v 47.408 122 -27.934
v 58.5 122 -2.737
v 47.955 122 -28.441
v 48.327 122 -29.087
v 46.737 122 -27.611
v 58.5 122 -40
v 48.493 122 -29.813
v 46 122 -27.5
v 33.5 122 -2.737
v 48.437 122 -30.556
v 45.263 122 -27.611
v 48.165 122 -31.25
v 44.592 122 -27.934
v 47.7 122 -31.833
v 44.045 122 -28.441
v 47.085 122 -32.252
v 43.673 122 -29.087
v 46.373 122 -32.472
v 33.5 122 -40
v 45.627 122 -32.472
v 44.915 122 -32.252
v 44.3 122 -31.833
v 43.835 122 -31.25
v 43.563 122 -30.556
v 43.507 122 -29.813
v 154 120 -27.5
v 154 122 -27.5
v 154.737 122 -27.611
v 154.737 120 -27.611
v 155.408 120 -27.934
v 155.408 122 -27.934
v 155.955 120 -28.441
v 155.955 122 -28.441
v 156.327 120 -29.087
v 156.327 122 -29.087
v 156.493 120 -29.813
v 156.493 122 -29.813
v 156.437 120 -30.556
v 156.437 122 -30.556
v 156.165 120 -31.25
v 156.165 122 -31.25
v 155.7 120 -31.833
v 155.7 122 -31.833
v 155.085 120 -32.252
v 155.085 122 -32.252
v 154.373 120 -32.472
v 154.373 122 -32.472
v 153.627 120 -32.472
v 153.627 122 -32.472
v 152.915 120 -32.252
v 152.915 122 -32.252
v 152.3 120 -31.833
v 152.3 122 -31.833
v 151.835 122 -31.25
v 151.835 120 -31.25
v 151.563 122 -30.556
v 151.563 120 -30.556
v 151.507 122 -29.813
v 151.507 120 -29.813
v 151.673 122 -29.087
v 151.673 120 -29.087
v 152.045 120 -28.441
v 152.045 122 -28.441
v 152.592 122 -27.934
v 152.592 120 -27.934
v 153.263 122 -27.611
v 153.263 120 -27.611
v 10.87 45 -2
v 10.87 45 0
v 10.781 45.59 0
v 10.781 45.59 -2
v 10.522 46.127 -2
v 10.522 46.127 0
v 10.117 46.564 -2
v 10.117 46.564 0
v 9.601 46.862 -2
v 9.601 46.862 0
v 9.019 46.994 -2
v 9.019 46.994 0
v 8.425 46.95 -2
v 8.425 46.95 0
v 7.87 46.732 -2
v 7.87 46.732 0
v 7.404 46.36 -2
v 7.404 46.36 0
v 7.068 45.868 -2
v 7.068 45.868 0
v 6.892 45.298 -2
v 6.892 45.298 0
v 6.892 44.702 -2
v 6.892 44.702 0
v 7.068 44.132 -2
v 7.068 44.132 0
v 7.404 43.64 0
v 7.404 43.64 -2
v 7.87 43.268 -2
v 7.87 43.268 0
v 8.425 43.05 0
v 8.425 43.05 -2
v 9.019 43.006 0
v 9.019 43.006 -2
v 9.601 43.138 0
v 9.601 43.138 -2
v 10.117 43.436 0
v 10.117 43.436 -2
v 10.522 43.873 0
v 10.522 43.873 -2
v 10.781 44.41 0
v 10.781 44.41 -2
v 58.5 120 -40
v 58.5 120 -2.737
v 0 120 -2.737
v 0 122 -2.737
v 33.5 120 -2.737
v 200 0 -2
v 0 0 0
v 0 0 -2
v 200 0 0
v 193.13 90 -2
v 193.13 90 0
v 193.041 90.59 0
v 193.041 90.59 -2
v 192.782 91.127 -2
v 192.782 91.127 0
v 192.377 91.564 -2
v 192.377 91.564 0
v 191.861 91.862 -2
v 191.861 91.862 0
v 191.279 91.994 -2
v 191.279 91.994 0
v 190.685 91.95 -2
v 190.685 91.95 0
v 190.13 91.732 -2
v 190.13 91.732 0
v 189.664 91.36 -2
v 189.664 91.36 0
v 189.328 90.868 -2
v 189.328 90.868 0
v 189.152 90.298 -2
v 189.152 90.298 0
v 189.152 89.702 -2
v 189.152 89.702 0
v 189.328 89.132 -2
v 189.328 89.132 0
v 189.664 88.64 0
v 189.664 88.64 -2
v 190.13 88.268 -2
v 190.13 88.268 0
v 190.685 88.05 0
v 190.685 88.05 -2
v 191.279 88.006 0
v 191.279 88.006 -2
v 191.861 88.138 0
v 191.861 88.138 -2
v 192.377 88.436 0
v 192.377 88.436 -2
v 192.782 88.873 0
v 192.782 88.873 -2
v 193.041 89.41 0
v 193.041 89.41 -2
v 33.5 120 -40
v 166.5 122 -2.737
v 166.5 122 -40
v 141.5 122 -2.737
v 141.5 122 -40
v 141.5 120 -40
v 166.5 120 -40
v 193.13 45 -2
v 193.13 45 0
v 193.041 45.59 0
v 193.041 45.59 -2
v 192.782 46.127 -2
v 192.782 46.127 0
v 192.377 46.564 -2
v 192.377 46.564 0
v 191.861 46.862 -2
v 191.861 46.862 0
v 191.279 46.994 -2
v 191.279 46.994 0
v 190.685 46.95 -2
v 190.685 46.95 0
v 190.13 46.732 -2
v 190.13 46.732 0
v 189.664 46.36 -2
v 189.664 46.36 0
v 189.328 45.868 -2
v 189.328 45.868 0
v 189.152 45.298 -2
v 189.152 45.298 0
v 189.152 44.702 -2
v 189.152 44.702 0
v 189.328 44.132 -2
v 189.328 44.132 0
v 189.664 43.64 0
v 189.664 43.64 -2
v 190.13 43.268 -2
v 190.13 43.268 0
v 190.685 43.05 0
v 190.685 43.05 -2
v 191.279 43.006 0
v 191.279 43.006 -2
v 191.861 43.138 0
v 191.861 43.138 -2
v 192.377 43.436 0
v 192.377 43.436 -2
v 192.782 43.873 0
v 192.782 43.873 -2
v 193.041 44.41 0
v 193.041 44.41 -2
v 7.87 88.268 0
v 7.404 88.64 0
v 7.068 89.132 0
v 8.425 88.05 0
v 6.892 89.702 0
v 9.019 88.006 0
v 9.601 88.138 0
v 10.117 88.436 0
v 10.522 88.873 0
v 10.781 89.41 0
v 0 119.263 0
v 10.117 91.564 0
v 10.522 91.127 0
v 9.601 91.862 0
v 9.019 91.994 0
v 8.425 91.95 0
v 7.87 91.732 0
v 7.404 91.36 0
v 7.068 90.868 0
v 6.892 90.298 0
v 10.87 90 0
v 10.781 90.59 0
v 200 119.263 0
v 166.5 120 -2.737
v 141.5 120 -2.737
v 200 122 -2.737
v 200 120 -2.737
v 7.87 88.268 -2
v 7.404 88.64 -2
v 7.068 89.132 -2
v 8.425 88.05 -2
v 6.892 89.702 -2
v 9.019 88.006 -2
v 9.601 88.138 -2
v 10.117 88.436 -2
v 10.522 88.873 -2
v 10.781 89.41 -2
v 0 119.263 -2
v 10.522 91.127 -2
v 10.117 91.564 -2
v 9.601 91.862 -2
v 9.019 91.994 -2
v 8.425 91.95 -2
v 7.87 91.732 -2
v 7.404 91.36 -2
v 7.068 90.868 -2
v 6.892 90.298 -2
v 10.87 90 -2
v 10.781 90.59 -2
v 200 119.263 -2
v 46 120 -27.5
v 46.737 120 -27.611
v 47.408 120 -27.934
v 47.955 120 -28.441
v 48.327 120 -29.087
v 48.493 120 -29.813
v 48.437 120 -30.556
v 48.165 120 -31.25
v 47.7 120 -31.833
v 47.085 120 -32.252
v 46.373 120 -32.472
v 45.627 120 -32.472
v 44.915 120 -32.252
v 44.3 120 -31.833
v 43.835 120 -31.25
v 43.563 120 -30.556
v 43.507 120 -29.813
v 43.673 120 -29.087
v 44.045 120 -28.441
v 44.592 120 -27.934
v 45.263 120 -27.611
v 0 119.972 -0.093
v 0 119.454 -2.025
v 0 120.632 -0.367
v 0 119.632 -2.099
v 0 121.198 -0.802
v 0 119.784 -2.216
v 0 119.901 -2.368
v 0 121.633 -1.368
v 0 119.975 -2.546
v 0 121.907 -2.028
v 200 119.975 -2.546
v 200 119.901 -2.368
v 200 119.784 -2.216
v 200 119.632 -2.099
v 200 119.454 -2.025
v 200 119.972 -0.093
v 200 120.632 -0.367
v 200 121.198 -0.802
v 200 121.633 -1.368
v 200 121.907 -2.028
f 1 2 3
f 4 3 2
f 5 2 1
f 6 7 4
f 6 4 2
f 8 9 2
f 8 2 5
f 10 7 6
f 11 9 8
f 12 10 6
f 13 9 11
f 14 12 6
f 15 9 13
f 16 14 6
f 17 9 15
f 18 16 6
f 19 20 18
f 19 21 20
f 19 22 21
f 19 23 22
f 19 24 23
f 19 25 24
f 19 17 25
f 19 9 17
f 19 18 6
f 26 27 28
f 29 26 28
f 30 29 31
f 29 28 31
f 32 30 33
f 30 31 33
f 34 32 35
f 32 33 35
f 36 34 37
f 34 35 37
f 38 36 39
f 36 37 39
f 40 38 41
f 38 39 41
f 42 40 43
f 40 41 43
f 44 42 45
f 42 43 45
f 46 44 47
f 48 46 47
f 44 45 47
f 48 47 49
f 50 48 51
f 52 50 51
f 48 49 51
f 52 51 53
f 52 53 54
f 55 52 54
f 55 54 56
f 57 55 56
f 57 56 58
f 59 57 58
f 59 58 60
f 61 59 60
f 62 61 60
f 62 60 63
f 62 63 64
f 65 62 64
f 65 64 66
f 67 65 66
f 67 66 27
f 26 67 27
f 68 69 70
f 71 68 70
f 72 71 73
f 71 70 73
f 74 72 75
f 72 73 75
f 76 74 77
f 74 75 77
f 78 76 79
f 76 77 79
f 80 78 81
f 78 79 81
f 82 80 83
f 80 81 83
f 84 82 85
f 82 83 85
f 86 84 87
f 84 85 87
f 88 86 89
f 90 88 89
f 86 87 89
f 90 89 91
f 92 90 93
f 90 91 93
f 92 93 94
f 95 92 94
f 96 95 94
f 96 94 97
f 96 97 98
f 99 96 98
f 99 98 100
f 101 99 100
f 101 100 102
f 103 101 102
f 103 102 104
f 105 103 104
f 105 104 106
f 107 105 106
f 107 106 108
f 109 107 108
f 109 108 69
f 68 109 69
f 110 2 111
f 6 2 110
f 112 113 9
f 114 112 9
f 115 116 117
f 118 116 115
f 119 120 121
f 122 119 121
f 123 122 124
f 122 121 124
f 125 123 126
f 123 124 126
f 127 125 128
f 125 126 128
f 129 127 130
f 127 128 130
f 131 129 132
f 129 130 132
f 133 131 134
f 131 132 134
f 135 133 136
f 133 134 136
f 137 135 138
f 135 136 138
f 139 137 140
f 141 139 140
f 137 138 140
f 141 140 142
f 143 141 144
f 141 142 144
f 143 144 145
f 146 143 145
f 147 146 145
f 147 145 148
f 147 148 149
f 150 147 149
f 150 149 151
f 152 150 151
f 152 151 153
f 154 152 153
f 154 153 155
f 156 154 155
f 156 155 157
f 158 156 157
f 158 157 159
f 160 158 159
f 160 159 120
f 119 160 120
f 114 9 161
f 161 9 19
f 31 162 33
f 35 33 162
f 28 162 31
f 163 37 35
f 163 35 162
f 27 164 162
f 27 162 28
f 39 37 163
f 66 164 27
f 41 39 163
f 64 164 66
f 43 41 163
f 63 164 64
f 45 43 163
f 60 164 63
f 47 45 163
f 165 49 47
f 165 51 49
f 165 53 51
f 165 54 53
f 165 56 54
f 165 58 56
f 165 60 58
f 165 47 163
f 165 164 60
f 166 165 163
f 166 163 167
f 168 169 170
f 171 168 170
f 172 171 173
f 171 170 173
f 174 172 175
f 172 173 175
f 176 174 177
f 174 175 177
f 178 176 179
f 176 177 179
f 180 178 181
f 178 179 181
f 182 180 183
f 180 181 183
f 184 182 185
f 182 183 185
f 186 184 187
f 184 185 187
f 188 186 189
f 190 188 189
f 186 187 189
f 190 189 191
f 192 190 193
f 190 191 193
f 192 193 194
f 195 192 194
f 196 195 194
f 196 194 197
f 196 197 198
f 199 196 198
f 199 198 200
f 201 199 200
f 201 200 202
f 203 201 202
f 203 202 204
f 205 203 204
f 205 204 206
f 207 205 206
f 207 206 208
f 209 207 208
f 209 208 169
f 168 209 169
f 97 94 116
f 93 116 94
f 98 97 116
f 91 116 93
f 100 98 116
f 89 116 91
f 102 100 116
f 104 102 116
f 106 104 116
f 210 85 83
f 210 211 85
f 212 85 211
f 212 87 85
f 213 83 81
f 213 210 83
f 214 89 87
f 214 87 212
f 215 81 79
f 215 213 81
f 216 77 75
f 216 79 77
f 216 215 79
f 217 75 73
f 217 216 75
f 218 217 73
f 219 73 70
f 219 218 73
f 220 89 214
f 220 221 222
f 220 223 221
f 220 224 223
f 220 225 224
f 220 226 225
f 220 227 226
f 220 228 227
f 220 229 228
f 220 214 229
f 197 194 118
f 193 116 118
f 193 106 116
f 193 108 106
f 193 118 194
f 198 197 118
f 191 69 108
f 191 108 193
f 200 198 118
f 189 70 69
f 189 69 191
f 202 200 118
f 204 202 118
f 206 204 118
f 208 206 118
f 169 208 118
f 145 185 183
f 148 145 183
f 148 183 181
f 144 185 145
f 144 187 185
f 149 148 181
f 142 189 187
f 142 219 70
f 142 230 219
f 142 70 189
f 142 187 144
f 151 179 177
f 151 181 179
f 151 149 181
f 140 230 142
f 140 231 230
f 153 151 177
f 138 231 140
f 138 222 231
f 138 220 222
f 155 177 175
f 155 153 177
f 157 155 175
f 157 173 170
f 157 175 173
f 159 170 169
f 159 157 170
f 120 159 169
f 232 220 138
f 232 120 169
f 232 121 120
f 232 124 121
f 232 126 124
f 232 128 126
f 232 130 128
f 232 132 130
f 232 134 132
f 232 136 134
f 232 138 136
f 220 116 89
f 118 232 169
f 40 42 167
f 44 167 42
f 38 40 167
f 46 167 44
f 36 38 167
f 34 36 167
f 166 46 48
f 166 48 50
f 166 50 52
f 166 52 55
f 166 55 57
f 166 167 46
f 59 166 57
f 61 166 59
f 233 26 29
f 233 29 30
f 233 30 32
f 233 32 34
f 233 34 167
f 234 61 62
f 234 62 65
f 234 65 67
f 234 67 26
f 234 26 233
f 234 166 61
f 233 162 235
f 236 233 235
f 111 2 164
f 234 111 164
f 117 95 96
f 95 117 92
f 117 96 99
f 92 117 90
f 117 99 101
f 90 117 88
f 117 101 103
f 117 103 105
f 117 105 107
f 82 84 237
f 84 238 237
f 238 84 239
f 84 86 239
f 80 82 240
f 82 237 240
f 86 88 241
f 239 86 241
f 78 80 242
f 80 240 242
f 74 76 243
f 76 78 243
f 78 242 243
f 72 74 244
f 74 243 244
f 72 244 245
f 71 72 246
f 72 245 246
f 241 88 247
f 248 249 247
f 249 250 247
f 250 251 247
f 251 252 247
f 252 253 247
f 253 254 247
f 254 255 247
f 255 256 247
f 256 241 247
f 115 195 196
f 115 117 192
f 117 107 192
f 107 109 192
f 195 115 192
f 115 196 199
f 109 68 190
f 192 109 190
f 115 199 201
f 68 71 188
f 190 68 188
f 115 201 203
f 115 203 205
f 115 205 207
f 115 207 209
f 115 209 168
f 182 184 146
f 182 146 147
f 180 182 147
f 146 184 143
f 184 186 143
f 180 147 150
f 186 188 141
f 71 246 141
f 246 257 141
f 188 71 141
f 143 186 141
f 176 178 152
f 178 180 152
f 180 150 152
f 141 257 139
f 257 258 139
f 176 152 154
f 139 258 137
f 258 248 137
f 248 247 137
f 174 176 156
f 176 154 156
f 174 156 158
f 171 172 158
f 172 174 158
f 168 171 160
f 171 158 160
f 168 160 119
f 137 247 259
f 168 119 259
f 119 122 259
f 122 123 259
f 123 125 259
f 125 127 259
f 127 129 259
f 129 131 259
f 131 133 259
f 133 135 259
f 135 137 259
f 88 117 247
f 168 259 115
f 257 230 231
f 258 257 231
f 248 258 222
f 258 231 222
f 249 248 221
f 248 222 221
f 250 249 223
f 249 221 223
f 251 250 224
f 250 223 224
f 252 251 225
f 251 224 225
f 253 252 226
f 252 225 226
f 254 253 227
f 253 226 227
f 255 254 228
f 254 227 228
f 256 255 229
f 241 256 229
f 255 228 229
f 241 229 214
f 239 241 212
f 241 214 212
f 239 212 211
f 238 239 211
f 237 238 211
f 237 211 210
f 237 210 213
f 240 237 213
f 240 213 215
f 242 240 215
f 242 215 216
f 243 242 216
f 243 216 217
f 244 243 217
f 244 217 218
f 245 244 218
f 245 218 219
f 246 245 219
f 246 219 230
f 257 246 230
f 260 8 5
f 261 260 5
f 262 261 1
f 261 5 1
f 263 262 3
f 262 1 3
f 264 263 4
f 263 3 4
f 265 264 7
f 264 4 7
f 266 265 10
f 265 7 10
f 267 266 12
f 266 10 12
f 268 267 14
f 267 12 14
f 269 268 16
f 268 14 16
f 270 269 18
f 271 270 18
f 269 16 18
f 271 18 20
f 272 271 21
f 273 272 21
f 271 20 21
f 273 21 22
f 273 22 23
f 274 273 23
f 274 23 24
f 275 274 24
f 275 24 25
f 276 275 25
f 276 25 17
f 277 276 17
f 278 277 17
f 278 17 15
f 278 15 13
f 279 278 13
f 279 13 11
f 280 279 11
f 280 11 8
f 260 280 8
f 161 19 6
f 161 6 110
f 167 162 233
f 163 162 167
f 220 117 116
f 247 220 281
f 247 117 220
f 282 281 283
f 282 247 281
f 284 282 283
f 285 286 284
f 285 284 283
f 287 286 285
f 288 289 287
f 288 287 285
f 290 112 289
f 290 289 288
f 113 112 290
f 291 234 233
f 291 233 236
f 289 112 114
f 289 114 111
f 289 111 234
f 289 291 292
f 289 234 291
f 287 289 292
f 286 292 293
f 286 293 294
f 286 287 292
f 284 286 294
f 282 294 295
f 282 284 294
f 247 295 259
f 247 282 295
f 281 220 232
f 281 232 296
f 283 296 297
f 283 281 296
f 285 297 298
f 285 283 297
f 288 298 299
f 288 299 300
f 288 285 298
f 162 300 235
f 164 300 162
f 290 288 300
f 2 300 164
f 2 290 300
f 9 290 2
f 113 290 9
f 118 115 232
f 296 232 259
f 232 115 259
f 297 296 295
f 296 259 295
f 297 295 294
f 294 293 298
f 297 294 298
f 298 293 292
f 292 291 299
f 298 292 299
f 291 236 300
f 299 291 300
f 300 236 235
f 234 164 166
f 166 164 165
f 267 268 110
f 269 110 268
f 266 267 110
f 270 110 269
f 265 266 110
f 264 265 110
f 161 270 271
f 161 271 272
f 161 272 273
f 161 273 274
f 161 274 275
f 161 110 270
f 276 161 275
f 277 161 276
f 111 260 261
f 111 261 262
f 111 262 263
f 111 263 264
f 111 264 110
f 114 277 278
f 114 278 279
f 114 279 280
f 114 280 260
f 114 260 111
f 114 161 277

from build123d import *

# Parameters (mm, degrees)
SKETCH2_W                    = 200
SKETCH2_H                    = 120
BASE_FLANGE1_DEPTH           = 2
CUT_EXTRUDE1_REACH           = 235.247
SKETCH7_R                    = 2
EDGE_FLANGE1_STRIP_W         = 9.4732
EDGE_FLANGE1_STRIP_H         = 2
EDGE_FLANGE1_STRIP_CUT_DEPTH = 200
EDGE_FLANGE1_DEPTH           = 200
CUT_EXTRUDE2_REACH           = 239.664
SKETCH11_R                   = 2.5
SKETCH11_W                   = 33.5
SKETCH11_H                   = 37.2634
SKETCH11_W_2                 = 83


# Sheet-metal steps are written as plain solids
with BuildPart() as part:
    # Sketch2 → Base-Flange1 (new body)
    with BuildSketch(Plane.XY):
        with Locations((100, 60)):
            Rectangle(SKETCH2_W, SKETCH2_H)
    extrude(amount=-BASE_FLANGE1_DEPTH)

    # Sketch7 → Cut-Extrude1 (cut, up to next)
    with BuildSketch(Plane.XY, mode=Mode.PRIVATE) as cut_extrude1_sk1:
        with Locations((8.87, 90)):
            Circle(SKETCH7_R)
    cut_extrude1_tool1 = extrude(cut_extrude1_sk1.sketch, amount=-CUT_EXTRUDE1_REACH, mode=Mode.PRIVATE) & part.part
    # Sketch7 → Cut-Extrude1 (cut, up to next)
    with BuildSketch(Plane.XY, mode=Mode.PRIVATE) as cut_extrude1_sk2:
        with Locations((8.87, 45)):
            Circle(SKETCH7_R)
    cut_extrude1_tool2 = extrude(cut_extrude1_sk2.sketch, amount=-CUT_EXTRUDE1_REACH, mode=Mode.PRIVATE) & part.part
    # Sketch7 → Cut-Extrude1 (cut, up to next)
    with BuildSketch(Plane.XY, mode=Mode.PRIVATE) as cut_extrude1_sk3:
        with Locations((191.13, 45)):
            Circle(SKETCH7_R)
    cut_extrude1_tool3 = extrude(cut_extrude1_sk3.sketch, amount=-CUT_EXTRUDE1_REACH, mode=Mode.PRIVATE) & part.part
    # Sketch7 → Cut-Extrude1 (cut, up to next)
    with BuildSketch(Plane.XY, mode=Mode.PRIVATE) as cut_extrude1_sk4:
        with Locations((191.13, 90)):
            Circle(SKETCH7_R)
    cut_extrude1_tool4 = extrude(cut_extrude1_sk4.sketch, amount=-CUT_EXTRUDE1_REACH, mode=Mode.PRIVATE) & part.part
    add(cut_extrude1_tool1.solids().sort_by_distance((8.87, 90, 0))[0], mode=Mode.SUBTRACT)
    add(cut_extrude1_tool2.solids().sort_by_distance((8.87, 45, 0))[0], mode=Mode.SUBTRACT)
    add(cut_extrude1_tool3.solids().sort_by_distance((191.13, 45, 0))[0], mode=Mode.SUBTRACT)
    add(cut_extrude1_tool4.solids().sort_by_distance((191.13, 90, 0))[0], mode=Mode.SUBTRACT)

    # Edge-Flange1 strip (across the edge) → Edge-Flange1 strip cut (cut)
    with BuildSketch(Plane(origin=(0, 120, -2), x_dir=(0, -1, 0), z_dir=(1, 0, 0))):
        with Locations((-4, -1)):
            Rectangle(EDGE_FLANGE1_STRIP_W, EDGE_FLANGE1_STRIP_H)
    extrude(amount=EDGE_FLANGE1_STRIP_CUT_DEPTH, mode=Mode.SUBTRACT)

    # Edge-Flange1 section (across the edge) → Edge-Flange1 (add)
    with BuildSketch(Plane(origin=(0, 120, -2), x_dir=(0, -1, 0), z_dir=(1, 0, 0))):
        with BuildLine():
            Line((-2, 0.7366), (-2, 38))
            Line((-2, 38), (0, 38))
            Line((0, 38), (0, 0.7366))
            ThreePointArc((0, 0.7366), (0.215745145, 0.215745145), (0.7366, 0))
            Line((0.7366, 0), (0.7366, -2))
            ThreePointArc((0.7366, -2), (-1.198468417, -1.198468417), (-2, 0.7366))
        make_face()
    extrude(amount=EDGE_FLANGE1_DEPTH)

    # Sketch11 → Cut-Extrude2 (cut, up to next)
    with BuildSketch(Plane(origin=(0, 122, 0), x_dir=(1, 0, 0), z_dir=(0, 1, 0)), mode=Mode.PRIVATE) as cut_extrude2_sk1:
        with Locations(Location((154, 30, 0), (0, 0, 270))):
            Circle(SKETCH11_R)
    cut_extrude2_tool1 = extrude(cut_extrude2_sk1.sketch, amount=-CUT_EXTRUDE2_REACH, mode=Mode.PRIVATE) & part.part
    # Sketch11 → Cut-Extrude2 (cut, up to next)
    with BuildSketch(Plane(origin=(0, 122, 0), x_dir=(1, 0, 0), z_dir=(0, 1, 0)), mode=Mode.PRIVATE) as cut_extrude2_sk2:
        with Locations(Location((46, 30, 0), (0, 0, 270))):
            Circle(SKETCH11_R)
    cut_extrude2_tool2 = extrude(cut_extrude2_sk2.sketch, amount=-CUT_EXTRUDE2_REACH, mode=Mode.PRIVATE) & part.part
    # Sketch11 → Cut-Extrude2 (cut, up to next)
    with BuildSketch(Plane(origin=(0, 122, 0), x_dir=(1, 0, 0), z_dir=(0, 1, 0)), mode=Mode.PRIVATE) as cut_extrude2_sk3:
        with Locations((183.25, 21.3683)):
            Rectangle(SKETCH11_W, SKETCH11_H)
    cut_extrude2_tool3 = extrude(cut_extrude2_sk3.sketch, amount=-CUT_EXTRUDE2_REACH, mode=Mode.PRIVATE) & part.part
    # Sketch11 → Cut-Extrude2 (cut, up to next)
    with BuildSketch(Plane(origin=(0, 122, 0), x_dir=(1, 0, 0), z_dir=(0, 1, 0)), mode=Mode.PRIVATE) as cut_extrude2_sk4:
        with Locations((100, 21.3683)):
            Rectangle(SKETCH11_W_2, SKETCH11_H)
    cut_extrude2_tool4 = extrude(cut_extrude2_sk4.sketch, amount=-CUT_EXTRUDE2_REACH, mode=Mode.PRIVATE) & part.part
    # Sketch11 → Cut-Extrude2 (cut, up to next)
    with BuildSketch(Plane(origin=(0, 122, 0), x_dir=(1, 0, 0), z_dir=(0, 1, 0)), mode=Mode.PRIVATE) as cut_extrude2_sk5:
        with Locations((16.75, 21.3683)):
            Rectangle(SKETCH11_W, SKETCH11_H)
    cut_extrude2_tool5 = extrude(cut_extrude2_sk5.sketch, amount=-CUT_EXTRUDE2_REACH, mode=Mode.PRIVATE) & part.part
    add(cut_extrude2_tool1.solids().sort_by_distance((154, 122, -30))[0], mode=Mode.SUBTRACT)
    add(cut_extrude2_tool2.solids().sort_by_distance((46, 122, -30))[0], mode=Mode.SUBTRACT)
    add(cut_extrude2_tool3.solids().sort_by_distance((183.25, 122, -21.3683))[0], mode=Mode.SUBTRACT)
    add(cut_extrude2_tool4.solids().sort_by_distance((100, 122, -21.3683))[0], mode=Mode.SUBTRACT)
    add(cut_extrude2_tool5.solids().sort_by_distance((16.75, 122, -21.3683))[0], mode=Mode.SUBTRACT)


solid = part.part
